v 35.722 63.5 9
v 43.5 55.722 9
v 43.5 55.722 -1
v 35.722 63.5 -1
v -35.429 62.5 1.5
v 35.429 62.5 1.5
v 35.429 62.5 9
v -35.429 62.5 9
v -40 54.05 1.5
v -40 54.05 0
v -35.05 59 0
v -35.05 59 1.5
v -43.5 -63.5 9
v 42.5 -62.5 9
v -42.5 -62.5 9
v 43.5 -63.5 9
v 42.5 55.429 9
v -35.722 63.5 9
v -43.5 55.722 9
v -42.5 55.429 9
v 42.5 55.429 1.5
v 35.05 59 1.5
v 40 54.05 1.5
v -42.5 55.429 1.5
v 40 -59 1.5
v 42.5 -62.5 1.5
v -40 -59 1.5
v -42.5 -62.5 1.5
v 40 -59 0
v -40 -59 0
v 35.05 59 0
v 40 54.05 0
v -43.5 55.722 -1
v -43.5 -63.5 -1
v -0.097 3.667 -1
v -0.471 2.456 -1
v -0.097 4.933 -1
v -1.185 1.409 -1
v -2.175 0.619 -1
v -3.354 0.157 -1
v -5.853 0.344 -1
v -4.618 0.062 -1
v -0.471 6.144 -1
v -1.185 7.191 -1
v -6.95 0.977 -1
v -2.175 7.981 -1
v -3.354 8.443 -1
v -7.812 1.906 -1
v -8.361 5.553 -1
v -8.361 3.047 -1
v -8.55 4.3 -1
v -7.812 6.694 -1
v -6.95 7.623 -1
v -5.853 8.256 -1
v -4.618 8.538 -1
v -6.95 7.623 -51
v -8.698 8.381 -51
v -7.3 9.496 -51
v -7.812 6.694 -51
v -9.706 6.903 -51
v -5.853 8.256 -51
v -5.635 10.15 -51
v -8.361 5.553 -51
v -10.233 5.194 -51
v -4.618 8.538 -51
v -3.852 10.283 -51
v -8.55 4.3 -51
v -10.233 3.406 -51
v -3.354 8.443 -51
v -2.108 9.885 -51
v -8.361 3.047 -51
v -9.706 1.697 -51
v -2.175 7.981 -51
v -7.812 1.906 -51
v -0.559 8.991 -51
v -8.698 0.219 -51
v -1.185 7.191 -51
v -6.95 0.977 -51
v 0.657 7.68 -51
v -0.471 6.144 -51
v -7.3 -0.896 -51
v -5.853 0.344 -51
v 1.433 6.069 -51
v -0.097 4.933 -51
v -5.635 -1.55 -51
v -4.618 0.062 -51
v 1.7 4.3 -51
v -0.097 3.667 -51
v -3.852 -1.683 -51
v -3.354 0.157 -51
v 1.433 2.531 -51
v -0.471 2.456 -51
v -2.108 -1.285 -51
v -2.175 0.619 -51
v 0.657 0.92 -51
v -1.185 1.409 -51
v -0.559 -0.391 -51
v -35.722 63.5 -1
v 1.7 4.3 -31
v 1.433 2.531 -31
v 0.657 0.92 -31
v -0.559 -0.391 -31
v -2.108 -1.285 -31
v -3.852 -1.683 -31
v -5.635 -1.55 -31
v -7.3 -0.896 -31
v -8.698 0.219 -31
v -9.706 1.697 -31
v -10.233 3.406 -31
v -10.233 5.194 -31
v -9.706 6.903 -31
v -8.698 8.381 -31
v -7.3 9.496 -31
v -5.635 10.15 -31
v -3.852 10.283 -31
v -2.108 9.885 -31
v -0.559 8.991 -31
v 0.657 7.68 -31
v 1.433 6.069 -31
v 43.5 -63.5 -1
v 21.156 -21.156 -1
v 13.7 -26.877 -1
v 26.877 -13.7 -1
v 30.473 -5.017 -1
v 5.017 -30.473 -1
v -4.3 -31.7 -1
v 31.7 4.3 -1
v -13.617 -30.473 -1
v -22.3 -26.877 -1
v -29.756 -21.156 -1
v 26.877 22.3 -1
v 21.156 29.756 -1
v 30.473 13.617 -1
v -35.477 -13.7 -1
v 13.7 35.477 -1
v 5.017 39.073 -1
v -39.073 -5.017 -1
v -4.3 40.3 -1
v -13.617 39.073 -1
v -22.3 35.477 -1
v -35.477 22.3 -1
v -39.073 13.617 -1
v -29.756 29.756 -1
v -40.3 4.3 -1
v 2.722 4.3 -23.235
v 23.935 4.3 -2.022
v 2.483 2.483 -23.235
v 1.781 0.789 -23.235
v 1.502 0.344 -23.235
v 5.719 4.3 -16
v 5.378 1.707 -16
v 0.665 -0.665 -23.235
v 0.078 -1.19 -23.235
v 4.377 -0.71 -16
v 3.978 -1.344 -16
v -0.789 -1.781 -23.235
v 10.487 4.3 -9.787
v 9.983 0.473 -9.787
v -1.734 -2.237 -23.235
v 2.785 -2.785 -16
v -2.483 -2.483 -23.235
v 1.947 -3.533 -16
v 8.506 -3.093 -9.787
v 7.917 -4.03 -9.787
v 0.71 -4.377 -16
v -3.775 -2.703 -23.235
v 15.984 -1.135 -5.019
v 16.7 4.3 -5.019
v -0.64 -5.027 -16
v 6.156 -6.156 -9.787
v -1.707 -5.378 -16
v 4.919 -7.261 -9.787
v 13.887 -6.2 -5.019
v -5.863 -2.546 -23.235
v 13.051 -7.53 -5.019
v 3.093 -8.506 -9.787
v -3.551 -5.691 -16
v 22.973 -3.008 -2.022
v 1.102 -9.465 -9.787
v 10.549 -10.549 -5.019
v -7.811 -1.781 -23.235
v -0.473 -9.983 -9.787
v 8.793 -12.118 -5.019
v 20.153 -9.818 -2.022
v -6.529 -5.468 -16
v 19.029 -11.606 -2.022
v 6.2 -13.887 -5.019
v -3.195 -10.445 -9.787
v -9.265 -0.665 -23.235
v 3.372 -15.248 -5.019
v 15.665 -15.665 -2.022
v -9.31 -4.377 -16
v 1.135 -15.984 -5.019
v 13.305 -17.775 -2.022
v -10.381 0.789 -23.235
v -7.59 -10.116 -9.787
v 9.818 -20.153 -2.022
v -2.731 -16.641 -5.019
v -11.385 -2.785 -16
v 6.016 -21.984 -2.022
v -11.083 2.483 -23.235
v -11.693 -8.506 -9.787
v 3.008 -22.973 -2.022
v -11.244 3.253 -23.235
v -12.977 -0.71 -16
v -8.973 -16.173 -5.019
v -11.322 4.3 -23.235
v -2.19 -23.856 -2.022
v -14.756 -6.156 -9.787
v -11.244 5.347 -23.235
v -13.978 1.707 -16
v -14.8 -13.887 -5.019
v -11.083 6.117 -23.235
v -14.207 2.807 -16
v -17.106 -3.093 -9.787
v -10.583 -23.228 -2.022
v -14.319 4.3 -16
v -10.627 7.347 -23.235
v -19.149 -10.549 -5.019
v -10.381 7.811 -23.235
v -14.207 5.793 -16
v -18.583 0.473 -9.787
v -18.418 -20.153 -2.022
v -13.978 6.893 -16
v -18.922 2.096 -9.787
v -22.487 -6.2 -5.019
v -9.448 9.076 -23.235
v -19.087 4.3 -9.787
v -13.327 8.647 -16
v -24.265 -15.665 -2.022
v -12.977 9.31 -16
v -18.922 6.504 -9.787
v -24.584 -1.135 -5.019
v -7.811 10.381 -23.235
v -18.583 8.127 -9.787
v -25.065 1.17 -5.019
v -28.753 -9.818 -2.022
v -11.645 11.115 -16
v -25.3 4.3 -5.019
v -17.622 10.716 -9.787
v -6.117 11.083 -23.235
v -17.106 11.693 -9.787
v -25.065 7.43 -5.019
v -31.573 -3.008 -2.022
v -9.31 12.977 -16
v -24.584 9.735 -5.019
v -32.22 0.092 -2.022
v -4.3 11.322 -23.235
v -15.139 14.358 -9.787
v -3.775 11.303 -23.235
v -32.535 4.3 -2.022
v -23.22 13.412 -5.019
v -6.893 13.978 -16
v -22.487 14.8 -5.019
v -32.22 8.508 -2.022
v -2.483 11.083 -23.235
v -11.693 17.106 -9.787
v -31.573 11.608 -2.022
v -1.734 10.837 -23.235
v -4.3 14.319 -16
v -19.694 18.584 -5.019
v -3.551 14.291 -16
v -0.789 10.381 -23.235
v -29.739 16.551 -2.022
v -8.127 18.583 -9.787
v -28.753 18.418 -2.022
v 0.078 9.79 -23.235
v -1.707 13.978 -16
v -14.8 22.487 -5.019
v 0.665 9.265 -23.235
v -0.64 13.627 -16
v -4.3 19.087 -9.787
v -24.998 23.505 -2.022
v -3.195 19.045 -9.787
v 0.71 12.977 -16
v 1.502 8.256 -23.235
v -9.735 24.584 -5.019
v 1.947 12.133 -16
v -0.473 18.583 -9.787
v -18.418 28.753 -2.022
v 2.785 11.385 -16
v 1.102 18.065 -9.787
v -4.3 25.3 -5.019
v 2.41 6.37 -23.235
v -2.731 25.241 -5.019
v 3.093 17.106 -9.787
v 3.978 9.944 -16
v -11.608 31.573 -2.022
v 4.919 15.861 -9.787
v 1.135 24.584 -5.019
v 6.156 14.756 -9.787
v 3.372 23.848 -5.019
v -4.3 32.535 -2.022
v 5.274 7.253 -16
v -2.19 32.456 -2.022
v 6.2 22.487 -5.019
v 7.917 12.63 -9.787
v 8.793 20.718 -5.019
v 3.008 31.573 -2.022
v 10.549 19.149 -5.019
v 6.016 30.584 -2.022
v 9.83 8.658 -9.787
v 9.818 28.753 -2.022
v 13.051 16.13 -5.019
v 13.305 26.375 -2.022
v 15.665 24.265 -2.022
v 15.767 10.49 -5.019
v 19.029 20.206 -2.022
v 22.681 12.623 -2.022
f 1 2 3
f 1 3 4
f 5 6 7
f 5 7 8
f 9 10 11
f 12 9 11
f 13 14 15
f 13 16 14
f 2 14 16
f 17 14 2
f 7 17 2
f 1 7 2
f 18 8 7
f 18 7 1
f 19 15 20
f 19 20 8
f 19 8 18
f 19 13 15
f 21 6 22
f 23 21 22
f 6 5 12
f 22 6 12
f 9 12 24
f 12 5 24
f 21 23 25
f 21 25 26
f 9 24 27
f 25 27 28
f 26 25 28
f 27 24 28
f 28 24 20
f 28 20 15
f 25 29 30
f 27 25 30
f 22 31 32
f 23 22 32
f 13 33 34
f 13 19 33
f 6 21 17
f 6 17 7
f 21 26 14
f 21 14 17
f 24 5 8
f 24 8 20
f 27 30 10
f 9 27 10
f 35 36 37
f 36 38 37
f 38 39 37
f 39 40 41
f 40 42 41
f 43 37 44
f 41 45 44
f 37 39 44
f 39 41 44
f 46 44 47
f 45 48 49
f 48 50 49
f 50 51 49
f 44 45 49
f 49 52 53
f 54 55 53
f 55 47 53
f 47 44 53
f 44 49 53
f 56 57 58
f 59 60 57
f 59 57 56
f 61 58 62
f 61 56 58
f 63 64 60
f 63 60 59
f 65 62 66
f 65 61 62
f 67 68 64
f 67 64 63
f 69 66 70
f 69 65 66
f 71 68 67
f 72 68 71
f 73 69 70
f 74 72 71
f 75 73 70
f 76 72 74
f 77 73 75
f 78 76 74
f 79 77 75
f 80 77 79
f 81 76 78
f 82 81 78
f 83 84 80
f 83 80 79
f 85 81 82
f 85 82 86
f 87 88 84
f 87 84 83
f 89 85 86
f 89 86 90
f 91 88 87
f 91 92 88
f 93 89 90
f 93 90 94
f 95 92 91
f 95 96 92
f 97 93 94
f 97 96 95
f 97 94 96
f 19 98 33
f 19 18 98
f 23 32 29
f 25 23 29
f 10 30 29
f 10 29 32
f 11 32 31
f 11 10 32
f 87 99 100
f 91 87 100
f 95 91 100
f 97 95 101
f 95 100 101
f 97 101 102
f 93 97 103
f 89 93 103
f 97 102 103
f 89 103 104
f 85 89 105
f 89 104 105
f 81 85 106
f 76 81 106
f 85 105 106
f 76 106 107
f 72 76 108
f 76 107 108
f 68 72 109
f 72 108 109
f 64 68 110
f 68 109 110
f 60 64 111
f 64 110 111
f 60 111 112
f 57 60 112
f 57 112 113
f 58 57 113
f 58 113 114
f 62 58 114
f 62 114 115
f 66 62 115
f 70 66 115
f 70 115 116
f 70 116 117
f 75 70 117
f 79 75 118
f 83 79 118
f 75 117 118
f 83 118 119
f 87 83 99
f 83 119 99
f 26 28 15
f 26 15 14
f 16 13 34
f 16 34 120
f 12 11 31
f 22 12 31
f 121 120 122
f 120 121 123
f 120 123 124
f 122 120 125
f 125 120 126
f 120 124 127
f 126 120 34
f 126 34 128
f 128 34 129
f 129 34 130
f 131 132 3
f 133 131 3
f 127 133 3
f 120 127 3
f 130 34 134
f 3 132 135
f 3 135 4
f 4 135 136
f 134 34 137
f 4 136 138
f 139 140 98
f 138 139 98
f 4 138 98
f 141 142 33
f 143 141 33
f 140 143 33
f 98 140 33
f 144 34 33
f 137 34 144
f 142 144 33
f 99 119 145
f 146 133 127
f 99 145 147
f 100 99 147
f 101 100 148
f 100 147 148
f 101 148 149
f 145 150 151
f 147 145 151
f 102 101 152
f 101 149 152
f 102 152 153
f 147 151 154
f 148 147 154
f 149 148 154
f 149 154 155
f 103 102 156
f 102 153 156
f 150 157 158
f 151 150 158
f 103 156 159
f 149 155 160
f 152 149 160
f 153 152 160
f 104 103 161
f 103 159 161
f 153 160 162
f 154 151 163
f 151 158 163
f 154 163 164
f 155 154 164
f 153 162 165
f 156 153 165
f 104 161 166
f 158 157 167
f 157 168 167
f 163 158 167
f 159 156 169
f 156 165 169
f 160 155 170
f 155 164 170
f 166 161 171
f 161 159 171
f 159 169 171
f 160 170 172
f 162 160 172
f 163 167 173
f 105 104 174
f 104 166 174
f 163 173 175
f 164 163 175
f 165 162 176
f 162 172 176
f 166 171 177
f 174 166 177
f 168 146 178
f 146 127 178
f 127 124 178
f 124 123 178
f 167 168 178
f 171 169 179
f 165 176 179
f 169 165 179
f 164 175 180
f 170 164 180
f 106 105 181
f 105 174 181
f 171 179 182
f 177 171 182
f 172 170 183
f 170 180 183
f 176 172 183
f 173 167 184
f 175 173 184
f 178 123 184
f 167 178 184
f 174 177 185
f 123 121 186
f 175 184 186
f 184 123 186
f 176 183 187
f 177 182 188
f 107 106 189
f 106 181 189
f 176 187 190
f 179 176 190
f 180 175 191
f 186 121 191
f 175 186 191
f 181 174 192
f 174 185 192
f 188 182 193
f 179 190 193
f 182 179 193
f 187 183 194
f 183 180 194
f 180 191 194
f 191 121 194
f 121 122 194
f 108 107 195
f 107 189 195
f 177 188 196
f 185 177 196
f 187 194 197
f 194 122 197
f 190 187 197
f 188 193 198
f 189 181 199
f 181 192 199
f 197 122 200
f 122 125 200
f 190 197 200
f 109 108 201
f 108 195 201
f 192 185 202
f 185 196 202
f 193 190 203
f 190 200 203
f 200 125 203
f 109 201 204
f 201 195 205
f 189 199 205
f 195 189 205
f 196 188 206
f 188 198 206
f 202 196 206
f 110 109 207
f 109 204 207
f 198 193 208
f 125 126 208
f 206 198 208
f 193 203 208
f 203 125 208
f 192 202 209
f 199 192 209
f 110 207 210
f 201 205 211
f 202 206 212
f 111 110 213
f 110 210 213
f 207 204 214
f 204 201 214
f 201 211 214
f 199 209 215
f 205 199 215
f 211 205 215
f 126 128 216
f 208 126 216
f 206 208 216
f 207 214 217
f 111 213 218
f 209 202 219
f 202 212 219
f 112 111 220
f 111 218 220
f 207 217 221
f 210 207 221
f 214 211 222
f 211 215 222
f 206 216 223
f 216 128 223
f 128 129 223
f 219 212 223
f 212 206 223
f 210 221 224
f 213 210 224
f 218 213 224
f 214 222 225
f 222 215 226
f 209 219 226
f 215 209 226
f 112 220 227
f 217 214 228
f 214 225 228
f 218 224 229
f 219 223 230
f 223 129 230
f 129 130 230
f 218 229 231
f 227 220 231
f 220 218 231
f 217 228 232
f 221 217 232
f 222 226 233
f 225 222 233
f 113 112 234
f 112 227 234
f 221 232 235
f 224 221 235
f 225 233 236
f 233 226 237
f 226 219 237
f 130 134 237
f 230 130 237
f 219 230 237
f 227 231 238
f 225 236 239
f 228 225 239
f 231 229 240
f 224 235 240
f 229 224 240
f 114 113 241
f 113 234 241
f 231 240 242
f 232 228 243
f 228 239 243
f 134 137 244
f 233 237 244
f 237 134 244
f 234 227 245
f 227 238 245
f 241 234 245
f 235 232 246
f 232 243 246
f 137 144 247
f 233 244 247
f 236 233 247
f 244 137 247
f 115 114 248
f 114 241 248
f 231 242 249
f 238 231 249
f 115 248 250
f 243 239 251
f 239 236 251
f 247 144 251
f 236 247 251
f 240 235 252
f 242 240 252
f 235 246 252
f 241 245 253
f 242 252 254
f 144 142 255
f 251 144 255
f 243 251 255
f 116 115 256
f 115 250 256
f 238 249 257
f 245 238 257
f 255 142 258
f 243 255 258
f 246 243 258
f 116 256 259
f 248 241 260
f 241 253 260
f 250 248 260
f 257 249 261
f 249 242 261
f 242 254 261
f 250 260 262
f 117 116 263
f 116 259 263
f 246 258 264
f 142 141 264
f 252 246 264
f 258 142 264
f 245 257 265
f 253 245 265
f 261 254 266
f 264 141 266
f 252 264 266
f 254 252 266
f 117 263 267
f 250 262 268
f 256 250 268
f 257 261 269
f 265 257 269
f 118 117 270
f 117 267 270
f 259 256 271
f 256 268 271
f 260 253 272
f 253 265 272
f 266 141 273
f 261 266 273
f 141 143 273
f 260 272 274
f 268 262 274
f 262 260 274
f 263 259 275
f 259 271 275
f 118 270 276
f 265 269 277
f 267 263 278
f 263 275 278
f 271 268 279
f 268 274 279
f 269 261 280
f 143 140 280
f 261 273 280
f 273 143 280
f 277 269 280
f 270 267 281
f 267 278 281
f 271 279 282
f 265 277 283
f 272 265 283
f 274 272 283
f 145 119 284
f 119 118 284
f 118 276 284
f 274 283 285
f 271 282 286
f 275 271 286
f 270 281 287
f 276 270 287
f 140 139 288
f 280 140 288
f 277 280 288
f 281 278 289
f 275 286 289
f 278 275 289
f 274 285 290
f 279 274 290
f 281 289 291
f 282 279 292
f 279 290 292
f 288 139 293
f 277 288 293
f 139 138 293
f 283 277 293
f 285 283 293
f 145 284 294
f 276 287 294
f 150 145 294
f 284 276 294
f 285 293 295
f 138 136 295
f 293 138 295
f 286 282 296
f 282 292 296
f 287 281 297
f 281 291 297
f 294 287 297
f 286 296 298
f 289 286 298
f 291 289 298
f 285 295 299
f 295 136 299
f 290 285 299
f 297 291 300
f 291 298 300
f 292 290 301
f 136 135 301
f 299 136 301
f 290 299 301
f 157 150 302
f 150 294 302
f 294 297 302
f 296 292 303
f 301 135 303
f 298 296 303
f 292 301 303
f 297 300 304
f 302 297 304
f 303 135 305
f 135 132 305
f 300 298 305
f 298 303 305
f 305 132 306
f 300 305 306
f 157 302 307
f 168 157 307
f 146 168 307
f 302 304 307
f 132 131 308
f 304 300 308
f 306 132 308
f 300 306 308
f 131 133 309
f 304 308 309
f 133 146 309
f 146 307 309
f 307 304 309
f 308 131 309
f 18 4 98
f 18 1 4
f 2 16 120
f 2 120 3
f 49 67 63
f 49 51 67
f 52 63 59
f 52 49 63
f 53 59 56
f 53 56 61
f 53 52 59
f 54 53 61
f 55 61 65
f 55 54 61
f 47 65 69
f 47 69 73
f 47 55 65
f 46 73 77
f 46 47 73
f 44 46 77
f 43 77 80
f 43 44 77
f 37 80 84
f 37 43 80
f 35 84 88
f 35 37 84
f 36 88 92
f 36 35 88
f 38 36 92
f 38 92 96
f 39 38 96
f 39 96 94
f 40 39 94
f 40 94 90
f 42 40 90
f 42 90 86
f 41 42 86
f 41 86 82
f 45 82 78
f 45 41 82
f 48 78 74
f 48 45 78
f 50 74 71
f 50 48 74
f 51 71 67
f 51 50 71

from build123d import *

# Parameters (mm, degrees)
BOSS_EXTRUDE1_DEPTH = 1.5
BOSS_EXTRUDE2_DEPTH = 9
BOSS_EXTRUDE3_DEPTH = 1
SKETCH4_R           = 6
SKETCH4_R_2         = 4.25
BOSS_EXTRUDE4_DEPTH = 50
SKETCH5_R           = 6
SKETCH5_R_2         = 4.25
BOSS_EXTRUDE5_DEPTH = 20
FILLET1_R           = 30


with BuildPart() as part:
    # Sketch1 → Boss-Extrude1 (new body)
    with BuildSketch(Plane(origin=(0, 0, 0), x_dir=(0, 1, 0), z_dir=(0, 0, 1))):
        Polygon((-62.5, -42.5), (-62.5, 42.5), (55.428932188, 42.5), (62.5, 35.428932188), (62.5, -35.428932188), (55.428932188, -42.5), align=None)
        Polygon((54.050252532, 40), (59, 35.050252532), (59, -35.050252532), (54.050252532, -40), (-59, -40), (-59, 40), align=None, mode=Mode.SUBTRACT)
    extrude(amount=BOSS_EXTRUDE1_DEPTH)

    # Sketch2 → Boss-Extrude2 (add)
    with BuildSketch(Plane(origin=(0, 0, 0), x_dir=(0, 1, 0), z_dir=(0, 0, 1))):
        Polygon((-63.5, 43.5), (-63.5, -43.5), (55.721825407, -43.5), (63.5, -35.721825407), (63.5, 35.721825407), (55.721825407, 43.5), align=None)
        Polygon((-62.5, -42.5), (55.428932188, -42.5), (62.5, -35.428932188), (62.5, 35.428932188), (55.428932188, 42.5), (-62.5, 42.5), align=None, mode=Mode.SUBTRACT)
    extrude(amount=BOSS_EXTRUDE2_DEPTH)

    # Sketch3 → Boss-Extrude3 (add)
    with BuildSketch(Plane(origin=(0, 0, 0), x_dir=(0, 1, 0), z_dir=(0, 0, 1))):
        Polygon((55.721825407, 43.5), (-63.5, 43.5), (-63.5, -43.5), (55.721825407, -43.5), (63.5, -35.721825407), (63.5, 35.721825407), align=None)
    extrude(amount=-BOSS_EXTRUDE3_DEPTH)

    # Sketch4 → Boss-Extrude4 (add)
    with BuildSketch(Plane(origin=(0, 0, -1), x_dir=(1, 0, 0), z_dir=(0, 0, -1))):
        with Locations((-4.3, -4.3)):
            Circle(SKETCH4_R)
        with Locations(Location((-4.3, -4.3, 0), (0, 0, 180))):
            Circle(SKETCH4_R_2, mode=Mode.SUBTRACT)
    extrude(amount=BOSS_EXTRUDE4_DEPTH)

    # Sketch5 → Boss-Extrude5 (add)
    with BuildSketch(Plane(origin=(0, 0, -1), x_dir=(1, 0, 0), z_dir=(0, 0, -1))):
        with Locations((-4.3, -4.3)):
            Circle(SKETCH5_R)
        with Locations(Location((-4.3, -4.3, 0), (0, 0, 180))):
            Circle(SKETCH5_R_2, mode=Mode.SUBTRACT)
    extrude(amount=BOSS_EXTRUDE5_DEPTH)

    # Fillet1
    fillet1_edges = [part.edges().sort_by_distance(p)[0] for p in [
        (-10.3, 4.3, -1),
    ]]
    fillet(fillet1_edges, radius=FILLET1_R)


solid = part.part
